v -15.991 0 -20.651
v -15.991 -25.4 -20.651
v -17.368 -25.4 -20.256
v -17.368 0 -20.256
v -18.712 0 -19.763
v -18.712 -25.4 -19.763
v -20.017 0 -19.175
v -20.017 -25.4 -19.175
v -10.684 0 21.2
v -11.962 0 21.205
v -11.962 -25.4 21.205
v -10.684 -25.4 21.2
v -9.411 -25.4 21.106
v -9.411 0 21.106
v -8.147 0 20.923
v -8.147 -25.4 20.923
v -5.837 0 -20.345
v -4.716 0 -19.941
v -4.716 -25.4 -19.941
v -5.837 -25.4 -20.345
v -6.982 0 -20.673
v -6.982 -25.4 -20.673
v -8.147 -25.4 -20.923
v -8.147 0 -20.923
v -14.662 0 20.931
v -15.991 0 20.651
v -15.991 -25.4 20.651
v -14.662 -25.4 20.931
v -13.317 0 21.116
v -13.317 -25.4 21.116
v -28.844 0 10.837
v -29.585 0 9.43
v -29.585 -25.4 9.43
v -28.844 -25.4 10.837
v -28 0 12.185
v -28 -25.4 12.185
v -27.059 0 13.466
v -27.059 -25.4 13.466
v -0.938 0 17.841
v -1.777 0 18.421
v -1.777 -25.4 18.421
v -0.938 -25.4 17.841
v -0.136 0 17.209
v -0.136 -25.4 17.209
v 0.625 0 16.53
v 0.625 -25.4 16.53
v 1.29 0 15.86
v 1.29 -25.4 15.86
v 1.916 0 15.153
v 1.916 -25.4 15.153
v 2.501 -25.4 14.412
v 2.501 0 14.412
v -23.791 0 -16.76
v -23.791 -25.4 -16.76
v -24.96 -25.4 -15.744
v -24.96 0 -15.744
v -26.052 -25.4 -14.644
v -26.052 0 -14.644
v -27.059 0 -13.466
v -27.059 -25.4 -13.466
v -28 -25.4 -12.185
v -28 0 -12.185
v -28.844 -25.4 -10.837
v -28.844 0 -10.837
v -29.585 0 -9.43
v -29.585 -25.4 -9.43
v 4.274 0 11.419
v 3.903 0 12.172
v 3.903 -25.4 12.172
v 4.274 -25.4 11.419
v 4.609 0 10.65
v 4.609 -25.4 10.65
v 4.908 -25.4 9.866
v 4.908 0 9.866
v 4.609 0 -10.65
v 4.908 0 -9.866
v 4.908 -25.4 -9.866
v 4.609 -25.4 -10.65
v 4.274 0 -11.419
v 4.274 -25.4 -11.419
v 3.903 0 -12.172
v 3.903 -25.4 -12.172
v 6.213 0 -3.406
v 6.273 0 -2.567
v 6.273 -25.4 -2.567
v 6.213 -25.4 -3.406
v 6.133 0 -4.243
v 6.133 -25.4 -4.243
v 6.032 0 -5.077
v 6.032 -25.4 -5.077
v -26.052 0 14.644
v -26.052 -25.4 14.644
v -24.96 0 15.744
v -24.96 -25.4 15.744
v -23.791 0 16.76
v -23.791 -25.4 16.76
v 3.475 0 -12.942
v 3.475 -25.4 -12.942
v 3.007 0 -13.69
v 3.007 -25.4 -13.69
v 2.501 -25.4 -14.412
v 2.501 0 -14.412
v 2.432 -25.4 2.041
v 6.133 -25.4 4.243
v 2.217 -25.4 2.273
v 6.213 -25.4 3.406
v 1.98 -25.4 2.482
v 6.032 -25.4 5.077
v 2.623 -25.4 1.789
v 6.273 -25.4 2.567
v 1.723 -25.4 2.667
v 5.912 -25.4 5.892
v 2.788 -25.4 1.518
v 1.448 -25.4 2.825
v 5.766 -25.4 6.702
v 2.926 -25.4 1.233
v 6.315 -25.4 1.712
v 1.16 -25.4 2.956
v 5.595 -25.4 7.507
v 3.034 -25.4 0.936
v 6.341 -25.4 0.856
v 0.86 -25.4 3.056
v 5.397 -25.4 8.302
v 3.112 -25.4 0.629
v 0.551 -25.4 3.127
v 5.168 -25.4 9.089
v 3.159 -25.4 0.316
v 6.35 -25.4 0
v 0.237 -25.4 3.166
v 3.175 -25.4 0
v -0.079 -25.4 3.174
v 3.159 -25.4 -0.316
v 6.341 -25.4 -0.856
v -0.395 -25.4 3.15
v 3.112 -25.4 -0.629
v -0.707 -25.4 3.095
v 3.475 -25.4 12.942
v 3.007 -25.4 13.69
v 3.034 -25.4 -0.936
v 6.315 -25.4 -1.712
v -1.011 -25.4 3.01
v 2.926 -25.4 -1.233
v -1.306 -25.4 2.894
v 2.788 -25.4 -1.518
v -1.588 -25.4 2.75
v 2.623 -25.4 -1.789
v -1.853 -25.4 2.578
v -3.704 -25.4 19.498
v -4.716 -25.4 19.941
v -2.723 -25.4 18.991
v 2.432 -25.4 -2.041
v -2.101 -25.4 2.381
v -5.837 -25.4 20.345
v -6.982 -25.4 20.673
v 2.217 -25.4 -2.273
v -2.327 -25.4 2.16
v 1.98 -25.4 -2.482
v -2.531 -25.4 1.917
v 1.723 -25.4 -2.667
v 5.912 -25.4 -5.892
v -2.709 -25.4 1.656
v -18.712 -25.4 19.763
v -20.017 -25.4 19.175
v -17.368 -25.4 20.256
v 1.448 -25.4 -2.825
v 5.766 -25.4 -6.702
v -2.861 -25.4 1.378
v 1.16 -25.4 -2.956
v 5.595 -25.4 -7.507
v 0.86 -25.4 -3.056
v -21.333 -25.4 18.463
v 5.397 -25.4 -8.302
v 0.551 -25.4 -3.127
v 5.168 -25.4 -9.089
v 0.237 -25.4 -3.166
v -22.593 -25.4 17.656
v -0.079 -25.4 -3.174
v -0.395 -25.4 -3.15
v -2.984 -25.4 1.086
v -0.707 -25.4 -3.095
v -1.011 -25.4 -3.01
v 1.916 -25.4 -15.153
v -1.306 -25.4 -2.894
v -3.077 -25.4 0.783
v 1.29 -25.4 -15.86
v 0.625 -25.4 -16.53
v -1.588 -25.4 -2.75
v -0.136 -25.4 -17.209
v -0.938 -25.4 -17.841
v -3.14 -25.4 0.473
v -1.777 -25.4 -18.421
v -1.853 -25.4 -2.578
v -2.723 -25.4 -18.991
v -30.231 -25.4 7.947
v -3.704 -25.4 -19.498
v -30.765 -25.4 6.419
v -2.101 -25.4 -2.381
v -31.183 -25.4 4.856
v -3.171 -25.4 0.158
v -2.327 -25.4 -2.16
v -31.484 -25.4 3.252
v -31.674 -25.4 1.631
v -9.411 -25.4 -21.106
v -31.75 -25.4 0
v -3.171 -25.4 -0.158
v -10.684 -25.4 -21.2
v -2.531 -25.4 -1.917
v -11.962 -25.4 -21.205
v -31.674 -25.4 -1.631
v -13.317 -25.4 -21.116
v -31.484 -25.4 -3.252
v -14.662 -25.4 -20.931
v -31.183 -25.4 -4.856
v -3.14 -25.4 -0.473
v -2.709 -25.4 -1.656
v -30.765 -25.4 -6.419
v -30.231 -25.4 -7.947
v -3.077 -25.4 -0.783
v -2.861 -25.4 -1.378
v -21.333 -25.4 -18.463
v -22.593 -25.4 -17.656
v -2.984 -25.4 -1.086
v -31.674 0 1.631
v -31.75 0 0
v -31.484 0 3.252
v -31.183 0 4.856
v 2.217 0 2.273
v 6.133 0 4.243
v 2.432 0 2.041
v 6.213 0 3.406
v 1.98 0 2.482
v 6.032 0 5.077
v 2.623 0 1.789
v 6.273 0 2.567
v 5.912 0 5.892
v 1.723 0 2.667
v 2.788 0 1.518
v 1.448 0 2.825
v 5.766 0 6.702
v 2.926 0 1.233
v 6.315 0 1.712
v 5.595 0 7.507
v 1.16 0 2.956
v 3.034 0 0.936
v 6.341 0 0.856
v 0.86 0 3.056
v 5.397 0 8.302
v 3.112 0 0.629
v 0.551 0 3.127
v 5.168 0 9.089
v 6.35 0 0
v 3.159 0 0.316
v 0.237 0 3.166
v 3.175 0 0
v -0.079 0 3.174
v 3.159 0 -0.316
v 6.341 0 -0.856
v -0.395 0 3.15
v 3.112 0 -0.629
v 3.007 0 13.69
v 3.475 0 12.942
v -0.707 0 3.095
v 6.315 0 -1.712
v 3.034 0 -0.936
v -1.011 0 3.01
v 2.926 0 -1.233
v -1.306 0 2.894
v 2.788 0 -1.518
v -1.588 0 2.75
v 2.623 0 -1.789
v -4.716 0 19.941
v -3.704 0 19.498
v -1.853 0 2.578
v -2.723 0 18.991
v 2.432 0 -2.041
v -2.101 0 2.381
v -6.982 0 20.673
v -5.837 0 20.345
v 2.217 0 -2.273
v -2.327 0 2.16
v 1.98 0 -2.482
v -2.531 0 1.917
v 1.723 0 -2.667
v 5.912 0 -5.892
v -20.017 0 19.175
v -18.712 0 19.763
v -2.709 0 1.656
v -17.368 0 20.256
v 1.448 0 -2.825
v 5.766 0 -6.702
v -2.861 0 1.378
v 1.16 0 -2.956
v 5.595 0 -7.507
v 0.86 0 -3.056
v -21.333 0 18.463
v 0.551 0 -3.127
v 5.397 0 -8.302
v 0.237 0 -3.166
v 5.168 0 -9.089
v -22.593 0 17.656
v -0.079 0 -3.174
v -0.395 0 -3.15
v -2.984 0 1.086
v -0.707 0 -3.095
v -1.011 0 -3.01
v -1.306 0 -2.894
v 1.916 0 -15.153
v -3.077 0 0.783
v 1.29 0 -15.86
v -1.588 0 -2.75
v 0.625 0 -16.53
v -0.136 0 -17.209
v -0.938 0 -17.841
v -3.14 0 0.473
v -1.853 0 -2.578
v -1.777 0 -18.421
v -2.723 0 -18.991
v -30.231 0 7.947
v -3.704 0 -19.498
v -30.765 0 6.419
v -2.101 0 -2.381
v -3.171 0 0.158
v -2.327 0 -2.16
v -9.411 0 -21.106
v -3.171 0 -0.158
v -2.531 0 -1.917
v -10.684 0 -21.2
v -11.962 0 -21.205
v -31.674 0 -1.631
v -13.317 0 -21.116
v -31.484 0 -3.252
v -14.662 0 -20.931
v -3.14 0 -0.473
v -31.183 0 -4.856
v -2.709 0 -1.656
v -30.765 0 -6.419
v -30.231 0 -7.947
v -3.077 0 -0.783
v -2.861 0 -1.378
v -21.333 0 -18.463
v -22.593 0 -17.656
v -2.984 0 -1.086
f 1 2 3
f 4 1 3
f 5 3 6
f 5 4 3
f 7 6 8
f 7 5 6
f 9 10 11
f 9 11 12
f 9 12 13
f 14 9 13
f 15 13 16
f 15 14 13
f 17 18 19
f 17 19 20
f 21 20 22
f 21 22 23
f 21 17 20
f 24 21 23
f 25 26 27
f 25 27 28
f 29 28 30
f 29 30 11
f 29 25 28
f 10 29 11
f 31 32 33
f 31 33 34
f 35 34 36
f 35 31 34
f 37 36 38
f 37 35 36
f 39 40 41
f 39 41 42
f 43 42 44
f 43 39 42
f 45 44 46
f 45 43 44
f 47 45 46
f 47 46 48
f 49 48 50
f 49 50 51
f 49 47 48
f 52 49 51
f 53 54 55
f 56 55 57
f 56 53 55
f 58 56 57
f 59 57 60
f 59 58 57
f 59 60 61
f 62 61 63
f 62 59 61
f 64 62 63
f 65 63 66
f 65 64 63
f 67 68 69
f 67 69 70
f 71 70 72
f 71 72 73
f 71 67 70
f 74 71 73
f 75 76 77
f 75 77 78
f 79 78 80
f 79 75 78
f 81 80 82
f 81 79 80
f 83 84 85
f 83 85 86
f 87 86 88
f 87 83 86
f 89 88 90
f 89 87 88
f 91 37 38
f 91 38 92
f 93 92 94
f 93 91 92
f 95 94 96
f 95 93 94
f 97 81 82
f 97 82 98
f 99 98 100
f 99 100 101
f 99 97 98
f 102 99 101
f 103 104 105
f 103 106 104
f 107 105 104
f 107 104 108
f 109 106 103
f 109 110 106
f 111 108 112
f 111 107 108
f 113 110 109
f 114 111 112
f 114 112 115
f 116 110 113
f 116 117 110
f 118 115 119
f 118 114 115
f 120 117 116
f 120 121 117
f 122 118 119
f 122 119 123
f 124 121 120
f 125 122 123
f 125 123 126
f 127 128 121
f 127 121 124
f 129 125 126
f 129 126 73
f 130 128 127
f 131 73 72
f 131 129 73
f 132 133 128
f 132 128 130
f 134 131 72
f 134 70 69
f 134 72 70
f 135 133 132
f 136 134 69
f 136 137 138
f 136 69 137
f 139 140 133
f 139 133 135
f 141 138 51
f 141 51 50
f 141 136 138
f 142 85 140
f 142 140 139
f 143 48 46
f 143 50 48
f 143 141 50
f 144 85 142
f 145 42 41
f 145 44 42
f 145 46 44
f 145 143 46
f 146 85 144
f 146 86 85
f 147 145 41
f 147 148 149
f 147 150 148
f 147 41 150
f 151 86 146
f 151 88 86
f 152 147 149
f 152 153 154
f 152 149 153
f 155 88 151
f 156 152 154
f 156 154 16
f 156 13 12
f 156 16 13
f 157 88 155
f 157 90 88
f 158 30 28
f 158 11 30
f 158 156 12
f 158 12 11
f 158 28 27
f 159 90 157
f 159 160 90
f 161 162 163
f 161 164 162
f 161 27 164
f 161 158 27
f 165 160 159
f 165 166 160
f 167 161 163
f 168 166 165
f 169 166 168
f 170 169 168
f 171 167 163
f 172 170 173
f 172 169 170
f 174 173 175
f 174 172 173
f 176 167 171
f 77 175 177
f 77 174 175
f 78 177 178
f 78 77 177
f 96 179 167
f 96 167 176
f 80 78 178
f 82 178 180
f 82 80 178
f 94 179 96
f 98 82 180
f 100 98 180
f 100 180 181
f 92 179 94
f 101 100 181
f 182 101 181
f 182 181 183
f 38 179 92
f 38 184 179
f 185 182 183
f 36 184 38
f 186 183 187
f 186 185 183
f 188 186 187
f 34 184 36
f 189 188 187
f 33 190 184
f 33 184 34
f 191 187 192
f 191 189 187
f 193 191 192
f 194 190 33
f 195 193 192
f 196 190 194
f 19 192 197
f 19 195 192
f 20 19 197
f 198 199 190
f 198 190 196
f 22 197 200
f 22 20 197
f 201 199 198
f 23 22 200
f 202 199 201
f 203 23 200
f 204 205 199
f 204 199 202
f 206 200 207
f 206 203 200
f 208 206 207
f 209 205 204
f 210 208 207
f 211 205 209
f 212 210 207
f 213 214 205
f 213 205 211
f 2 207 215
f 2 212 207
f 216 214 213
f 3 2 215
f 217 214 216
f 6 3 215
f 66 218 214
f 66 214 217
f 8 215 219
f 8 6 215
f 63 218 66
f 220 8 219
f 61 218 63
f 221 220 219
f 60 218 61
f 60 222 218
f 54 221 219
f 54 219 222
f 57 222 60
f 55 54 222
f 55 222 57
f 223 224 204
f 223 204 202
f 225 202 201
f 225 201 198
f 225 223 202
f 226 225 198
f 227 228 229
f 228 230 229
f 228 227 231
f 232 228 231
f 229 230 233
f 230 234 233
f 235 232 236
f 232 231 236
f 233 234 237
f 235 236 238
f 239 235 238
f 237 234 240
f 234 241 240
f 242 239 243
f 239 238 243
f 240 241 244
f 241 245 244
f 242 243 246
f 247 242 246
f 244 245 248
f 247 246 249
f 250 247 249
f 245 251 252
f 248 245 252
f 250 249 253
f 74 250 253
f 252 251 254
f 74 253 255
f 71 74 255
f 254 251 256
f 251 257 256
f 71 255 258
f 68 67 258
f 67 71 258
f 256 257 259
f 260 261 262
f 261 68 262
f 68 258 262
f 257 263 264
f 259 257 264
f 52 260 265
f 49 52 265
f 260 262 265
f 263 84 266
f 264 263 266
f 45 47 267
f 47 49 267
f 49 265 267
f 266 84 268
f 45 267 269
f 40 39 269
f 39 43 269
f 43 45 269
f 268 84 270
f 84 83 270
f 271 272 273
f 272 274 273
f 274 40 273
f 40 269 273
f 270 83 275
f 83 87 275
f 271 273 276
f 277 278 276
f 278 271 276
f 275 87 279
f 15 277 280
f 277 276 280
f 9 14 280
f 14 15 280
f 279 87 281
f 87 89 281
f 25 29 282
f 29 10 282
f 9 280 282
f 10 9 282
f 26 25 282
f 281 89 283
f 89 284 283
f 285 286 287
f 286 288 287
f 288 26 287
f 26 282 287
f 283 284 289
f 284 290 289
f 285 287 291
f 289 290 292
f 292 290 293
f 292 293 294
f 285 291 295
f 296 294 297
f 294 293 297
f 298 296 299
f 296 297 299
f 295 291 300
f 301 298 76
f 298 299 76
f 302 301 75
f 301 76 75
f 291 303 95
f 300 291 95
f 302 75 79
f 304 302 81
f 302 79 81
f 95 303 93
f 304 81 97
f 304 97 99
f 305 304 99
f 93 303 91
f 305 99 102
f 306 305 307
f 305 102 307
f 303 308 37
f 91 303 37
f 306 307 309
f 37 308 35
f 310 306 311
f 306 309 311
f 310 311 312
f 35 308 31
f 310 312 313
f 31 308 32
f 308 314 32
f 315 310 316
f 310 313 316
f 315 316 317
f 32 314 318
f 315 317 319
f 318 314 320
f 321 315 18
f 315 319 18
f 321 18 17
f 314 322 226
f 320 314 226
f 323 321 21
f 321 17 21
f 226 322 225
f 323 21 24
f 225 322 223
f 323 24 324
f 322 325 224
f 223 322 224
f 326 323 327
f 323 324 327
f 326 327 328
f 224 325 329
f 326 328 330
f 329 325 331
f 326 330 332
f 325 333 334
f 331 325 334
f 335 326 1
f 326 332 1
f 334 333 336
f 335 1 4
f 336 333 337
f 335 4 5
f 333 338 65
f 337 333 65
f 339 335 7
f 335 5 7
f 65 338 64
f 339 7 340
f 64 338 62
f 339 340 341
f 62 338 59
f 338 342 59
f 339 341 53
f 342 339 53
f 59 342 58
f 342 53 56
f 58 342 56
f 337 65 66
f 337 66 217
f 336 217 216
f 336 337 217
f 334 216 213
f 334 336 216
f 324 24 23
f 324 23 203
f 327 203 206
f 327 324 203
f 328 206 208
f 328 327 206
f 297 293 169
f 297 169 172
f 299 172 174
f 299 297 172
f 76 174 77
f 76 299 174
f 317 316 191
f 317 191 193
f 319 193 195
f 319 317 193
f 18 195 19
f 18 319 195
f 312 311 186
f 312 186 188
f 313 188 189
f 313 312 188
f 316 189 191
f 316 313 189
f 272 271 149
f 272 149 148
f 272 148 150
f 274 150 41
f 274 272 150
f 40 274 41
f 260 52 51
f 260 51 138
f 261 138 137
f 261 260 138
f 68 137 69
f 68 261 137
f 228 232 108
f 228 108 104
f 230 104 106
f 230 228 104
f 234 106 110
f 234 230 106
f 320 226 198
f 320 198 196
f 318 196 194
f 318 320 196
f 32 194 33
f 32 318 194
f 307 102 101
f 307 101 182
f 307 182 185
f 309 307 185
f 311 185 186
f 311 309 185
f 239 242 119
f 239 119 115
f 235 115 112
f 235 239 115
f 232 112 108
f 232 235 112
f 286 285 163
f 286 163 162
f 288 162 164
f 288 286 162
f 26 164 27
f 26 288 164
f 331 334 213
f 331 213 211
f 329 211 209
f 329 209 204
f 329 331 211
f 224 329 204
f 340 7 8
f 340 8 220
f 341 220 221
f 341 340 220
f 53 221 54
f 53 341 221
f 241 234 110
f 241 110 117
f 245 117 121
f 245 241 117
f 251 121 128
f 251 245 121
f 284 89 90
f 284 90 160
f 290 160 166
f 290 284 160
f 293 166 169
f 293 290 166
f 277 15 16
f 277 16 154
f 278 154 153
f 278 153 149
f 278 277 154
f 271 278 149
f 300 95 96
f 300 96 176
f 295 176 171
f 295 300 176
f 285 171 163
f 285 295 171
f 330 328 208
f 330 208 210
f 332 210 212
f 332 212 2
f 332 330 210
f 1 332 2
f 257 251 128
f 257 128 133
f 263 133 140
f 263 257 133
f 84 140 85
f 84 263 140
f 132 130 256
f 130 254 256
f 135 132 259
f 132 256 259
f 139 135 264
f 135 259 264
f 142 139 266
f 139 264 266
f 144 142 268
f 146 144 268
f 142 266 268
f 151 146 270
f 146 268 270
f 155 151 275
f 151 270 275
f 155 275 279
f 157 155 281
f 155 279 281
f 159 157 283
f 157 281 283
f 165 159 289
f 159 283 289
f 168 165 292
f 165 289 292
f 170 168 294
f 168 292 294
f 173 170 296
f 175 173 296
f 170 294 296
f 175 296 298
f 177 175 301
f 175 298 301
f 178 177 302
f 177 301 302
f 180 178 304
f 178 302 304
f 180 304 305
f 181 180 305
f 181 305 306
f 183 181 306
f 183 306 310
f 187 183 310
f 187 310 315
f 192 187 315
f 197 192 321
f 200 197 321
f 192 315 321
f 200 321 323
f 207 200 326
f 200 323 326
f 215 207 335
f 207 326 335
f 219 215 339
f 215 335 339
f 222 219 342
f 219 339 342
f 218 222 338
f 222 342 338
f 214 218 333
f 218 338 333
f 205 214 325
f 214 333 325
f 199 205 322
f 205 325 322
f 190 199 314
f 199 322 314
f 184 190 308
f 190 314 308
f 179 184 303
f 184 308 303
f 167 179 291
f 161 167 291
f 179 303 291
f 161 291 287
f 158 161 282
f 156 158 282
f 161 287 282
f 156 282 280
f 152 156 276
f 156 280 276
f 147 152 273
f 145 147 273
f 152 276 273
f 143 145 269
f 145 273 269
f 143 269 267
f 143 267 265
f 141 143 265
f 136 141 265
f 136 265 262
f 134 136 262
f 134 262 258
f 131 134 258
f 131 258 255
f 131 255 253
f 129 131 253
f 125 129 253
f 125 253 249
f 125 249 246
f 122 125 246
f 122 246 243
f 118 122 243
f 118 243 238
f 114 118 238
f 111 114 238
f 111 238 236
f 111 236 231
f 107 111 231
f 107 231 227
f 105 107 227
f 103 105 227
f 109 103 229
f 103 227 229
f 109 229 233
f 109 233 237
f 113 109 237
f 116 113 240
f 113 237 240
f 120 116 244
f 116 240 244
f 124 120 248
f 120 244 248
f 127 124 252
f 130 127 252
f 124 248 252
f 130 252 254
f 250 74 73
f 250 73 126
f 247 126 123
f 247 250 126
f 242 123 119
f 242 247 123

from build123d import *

# Parameters (mm, degrees)
SKETCH1_W               = 123.825
SKETCH1_H               = 25.4
SKETCH2_OUTSIDE_W       = 328.022
SKETCH2_OUTSIDE_H       = 328.022
CUT_EXTRUDE1_DEPTH      = 10
CUT_EXTRUDE1_DEPTH_BACK = 35.4


with BuildPart() as part:
    # Sketch1 → Revolve1 (revolve)
    with BuildSketch(Plane.XY):
        with Locations((65.0875, -12.7)):
            Rectangle(SKETCH1_W, SKETCH1_H)
    revolve(axis=Axis((0, -1254, 0), (0, 1, 0)))

    # Sketch2 outside → Cut-Extrude1 (cut, two sides)
    with BuildSketch(Plane(origin=(0, 0, 0), x_dir=(1, 0, 0), z_dir=(0, 1, 0))) as cut_extrude1_sk:
        Rectangle(SKETCH2_OUTSIDE_W, SKETCH2_OUTSIDE_H)
        with BuildLine():
            ThreePointArc((6.35, 0), (6.329912836, 1.284135818), (6.27254171, 2.56714667))
            ThreePointArc((6.27254171, 2.56714667), (6.175326887, 3.824361251), (6.03246285, 5.077209643))
            ThreePointArc((6.03246285, 5.077209643), (5.842143008, 6.297144559), (5.595092591, 7.506867226))
            ThreePointArc((5.595092591, 7.506867226), (5.286100034, 8.696690934), (4.908320284, 9.866494044))
            ThreePointArc((4.908320284, 9.866494044), (4.445694933, 11.036480903), (3.903262447, 12.17167184))
            ThreePointArc((3.903262447, 12.17167184), (3.246006434, 13.319190062), (2.500680026, 14.411559999))
            ThreePointArc((2.500680026, 14.411559999), (1.608536581, 15.51119354), (0.624958662, 16.529863421))
            ThreePointArc((0.624958662, 16.529863421), (-0.532205476, 17.53111816), (-1.776823287, 18.421323977))
            ThreePointArc((-1.776823287, 18.421323977), (-3.209328759, 19.252740722), (-4.715795066, 19.941133777))
            ThreePointArc((-4.715795066, 19.941133777), (-6.406453621, 20.519055391), (-8.146794068, 20.923449837))
            ThreePointArc((-8.146794068, 20.923449837), (-10.046848772, 21.163603755), (-11.961570845, 21.205090642))
            ThreePointArc((-11.961570845, 21.205090642), (-13.991121641, 21.035122659), (-15.99114089, 20.650559852))
            ThreePointArc((-15.99114089, 20.650559852), (-18.044142393, 20.021705604), (-20.01719815, 19.174755893))
            ThreePointArc((-20.01719815, 19.174755893), (-21.970442626, 18.071028594), (-23.791190022, 16.760205626))
            ThreePointArc((-23.791190022, 16.760205626), (-25.516143096, 15.203834234), (-27.05861892, 13.466444423))
            ThreePointArc((-27.05861892, 13.466444423), (-28.434599881, 11.518792927), (-29.585456445, 9.430205097))
            ThreePointArc((-29.585456445, 9.430205097), (-30.512481977, 7.187988004), (-31.183290683, 4.85626557))
            ThreePointArc((-31.183290683, 4.85626557), (-31.593025755, 2.44288094), (-31.75, 0))
            ThreePointArc((-31.75, 0), (-31.593025755, -2.44288094), (-31.183290683, -4.85626557))
            ThreePointArc((-31.183290683, -4.85626557), (-30.512481977, -7.187988004), (-29.585456445, -9.430205097))
            ThreePointArc((-29.585456445, -9.430205097), (-28.434599881, -11.518792927), (-27.05861892, -13.466444423))
            ThreePointArc((-27.05861892, -13.466444423), (-25.516143096, -15.203834234), (-23.791190022, -16.760205626))
            ThreePointArc((-23.791190022, -16.760205626), (-21.970442626, -18.071028594), (-20.01719815, -19.174755893))
            ThreePointArc((-20.01719815, -19.174755893), (-18.044142393, -20.021705604), (-15.99114089, -20.650559852))
            ThreePointArc((-15.99114089, -20.650559852), (-13.991121641, -21.035122659), (-11.961570845, -21.205090642))
            ThreePointArc((-11.961570845, -21.205090642), (-10.046848772, -21.163603755), (-8.146794068, -20.923449837))
            ThreePointArc((-8.146794068, -20.923449837), (-6.406453621, -20.519055391), (-4.715795066, -19.941133777))
            ThreePointArc((-4.715795066, -19.941133777), (-3.209328759, -19.252740722), (-1.776823287, -18.421323977))
            ThreePointArc((-1.776823287, -18.421323977), (-0.532205476, -17.53111816), (0.624958662, -16.529863421))
            ThreePointArc((0.624958662, -16.529863421), (1.608536581, -15.51119354), (2.500680026, -14.411559999))
            ThreePointArc((2.500680026, -14.411559999), (3.246006434, -13.319190062), (3.903262447, -12.17167184))
            ThreePointArc((3.903262447, -12.17167184), (4.445694933, -11.036480903), (4.908320284, -9.866494044))
            ThreePointArc((4.908320284, -9.866494044), (5.286100034, -8.696690934), (5.595092591, -7.506867226))
            ThreePointArc((5.595092591, -7.506867226), (5.842143008, -6.297144559), (6.03246285, -5.077209643))
            ThreePointArc((6.03246285, -5.077209643), (6.175326887, -3.824361251), (6.27254171, -2.56714667))
            ThreePointArc((6.27254171, -2.56714667), (6.329912836, -1.284135818), (6.35, 0))
        make_face(mode=Mode.SUBTRACT)
    extrude(amount=CUT_EXTRUDE1_DEPTH, mode=Mode.SUBTRACT)
    extrude(cut_extrude1_sk.sketch, amount=-CUT_EXTRUDE1_DEPTH_BACK, mode=Mode.SUBTRACT)


solid = part.part
